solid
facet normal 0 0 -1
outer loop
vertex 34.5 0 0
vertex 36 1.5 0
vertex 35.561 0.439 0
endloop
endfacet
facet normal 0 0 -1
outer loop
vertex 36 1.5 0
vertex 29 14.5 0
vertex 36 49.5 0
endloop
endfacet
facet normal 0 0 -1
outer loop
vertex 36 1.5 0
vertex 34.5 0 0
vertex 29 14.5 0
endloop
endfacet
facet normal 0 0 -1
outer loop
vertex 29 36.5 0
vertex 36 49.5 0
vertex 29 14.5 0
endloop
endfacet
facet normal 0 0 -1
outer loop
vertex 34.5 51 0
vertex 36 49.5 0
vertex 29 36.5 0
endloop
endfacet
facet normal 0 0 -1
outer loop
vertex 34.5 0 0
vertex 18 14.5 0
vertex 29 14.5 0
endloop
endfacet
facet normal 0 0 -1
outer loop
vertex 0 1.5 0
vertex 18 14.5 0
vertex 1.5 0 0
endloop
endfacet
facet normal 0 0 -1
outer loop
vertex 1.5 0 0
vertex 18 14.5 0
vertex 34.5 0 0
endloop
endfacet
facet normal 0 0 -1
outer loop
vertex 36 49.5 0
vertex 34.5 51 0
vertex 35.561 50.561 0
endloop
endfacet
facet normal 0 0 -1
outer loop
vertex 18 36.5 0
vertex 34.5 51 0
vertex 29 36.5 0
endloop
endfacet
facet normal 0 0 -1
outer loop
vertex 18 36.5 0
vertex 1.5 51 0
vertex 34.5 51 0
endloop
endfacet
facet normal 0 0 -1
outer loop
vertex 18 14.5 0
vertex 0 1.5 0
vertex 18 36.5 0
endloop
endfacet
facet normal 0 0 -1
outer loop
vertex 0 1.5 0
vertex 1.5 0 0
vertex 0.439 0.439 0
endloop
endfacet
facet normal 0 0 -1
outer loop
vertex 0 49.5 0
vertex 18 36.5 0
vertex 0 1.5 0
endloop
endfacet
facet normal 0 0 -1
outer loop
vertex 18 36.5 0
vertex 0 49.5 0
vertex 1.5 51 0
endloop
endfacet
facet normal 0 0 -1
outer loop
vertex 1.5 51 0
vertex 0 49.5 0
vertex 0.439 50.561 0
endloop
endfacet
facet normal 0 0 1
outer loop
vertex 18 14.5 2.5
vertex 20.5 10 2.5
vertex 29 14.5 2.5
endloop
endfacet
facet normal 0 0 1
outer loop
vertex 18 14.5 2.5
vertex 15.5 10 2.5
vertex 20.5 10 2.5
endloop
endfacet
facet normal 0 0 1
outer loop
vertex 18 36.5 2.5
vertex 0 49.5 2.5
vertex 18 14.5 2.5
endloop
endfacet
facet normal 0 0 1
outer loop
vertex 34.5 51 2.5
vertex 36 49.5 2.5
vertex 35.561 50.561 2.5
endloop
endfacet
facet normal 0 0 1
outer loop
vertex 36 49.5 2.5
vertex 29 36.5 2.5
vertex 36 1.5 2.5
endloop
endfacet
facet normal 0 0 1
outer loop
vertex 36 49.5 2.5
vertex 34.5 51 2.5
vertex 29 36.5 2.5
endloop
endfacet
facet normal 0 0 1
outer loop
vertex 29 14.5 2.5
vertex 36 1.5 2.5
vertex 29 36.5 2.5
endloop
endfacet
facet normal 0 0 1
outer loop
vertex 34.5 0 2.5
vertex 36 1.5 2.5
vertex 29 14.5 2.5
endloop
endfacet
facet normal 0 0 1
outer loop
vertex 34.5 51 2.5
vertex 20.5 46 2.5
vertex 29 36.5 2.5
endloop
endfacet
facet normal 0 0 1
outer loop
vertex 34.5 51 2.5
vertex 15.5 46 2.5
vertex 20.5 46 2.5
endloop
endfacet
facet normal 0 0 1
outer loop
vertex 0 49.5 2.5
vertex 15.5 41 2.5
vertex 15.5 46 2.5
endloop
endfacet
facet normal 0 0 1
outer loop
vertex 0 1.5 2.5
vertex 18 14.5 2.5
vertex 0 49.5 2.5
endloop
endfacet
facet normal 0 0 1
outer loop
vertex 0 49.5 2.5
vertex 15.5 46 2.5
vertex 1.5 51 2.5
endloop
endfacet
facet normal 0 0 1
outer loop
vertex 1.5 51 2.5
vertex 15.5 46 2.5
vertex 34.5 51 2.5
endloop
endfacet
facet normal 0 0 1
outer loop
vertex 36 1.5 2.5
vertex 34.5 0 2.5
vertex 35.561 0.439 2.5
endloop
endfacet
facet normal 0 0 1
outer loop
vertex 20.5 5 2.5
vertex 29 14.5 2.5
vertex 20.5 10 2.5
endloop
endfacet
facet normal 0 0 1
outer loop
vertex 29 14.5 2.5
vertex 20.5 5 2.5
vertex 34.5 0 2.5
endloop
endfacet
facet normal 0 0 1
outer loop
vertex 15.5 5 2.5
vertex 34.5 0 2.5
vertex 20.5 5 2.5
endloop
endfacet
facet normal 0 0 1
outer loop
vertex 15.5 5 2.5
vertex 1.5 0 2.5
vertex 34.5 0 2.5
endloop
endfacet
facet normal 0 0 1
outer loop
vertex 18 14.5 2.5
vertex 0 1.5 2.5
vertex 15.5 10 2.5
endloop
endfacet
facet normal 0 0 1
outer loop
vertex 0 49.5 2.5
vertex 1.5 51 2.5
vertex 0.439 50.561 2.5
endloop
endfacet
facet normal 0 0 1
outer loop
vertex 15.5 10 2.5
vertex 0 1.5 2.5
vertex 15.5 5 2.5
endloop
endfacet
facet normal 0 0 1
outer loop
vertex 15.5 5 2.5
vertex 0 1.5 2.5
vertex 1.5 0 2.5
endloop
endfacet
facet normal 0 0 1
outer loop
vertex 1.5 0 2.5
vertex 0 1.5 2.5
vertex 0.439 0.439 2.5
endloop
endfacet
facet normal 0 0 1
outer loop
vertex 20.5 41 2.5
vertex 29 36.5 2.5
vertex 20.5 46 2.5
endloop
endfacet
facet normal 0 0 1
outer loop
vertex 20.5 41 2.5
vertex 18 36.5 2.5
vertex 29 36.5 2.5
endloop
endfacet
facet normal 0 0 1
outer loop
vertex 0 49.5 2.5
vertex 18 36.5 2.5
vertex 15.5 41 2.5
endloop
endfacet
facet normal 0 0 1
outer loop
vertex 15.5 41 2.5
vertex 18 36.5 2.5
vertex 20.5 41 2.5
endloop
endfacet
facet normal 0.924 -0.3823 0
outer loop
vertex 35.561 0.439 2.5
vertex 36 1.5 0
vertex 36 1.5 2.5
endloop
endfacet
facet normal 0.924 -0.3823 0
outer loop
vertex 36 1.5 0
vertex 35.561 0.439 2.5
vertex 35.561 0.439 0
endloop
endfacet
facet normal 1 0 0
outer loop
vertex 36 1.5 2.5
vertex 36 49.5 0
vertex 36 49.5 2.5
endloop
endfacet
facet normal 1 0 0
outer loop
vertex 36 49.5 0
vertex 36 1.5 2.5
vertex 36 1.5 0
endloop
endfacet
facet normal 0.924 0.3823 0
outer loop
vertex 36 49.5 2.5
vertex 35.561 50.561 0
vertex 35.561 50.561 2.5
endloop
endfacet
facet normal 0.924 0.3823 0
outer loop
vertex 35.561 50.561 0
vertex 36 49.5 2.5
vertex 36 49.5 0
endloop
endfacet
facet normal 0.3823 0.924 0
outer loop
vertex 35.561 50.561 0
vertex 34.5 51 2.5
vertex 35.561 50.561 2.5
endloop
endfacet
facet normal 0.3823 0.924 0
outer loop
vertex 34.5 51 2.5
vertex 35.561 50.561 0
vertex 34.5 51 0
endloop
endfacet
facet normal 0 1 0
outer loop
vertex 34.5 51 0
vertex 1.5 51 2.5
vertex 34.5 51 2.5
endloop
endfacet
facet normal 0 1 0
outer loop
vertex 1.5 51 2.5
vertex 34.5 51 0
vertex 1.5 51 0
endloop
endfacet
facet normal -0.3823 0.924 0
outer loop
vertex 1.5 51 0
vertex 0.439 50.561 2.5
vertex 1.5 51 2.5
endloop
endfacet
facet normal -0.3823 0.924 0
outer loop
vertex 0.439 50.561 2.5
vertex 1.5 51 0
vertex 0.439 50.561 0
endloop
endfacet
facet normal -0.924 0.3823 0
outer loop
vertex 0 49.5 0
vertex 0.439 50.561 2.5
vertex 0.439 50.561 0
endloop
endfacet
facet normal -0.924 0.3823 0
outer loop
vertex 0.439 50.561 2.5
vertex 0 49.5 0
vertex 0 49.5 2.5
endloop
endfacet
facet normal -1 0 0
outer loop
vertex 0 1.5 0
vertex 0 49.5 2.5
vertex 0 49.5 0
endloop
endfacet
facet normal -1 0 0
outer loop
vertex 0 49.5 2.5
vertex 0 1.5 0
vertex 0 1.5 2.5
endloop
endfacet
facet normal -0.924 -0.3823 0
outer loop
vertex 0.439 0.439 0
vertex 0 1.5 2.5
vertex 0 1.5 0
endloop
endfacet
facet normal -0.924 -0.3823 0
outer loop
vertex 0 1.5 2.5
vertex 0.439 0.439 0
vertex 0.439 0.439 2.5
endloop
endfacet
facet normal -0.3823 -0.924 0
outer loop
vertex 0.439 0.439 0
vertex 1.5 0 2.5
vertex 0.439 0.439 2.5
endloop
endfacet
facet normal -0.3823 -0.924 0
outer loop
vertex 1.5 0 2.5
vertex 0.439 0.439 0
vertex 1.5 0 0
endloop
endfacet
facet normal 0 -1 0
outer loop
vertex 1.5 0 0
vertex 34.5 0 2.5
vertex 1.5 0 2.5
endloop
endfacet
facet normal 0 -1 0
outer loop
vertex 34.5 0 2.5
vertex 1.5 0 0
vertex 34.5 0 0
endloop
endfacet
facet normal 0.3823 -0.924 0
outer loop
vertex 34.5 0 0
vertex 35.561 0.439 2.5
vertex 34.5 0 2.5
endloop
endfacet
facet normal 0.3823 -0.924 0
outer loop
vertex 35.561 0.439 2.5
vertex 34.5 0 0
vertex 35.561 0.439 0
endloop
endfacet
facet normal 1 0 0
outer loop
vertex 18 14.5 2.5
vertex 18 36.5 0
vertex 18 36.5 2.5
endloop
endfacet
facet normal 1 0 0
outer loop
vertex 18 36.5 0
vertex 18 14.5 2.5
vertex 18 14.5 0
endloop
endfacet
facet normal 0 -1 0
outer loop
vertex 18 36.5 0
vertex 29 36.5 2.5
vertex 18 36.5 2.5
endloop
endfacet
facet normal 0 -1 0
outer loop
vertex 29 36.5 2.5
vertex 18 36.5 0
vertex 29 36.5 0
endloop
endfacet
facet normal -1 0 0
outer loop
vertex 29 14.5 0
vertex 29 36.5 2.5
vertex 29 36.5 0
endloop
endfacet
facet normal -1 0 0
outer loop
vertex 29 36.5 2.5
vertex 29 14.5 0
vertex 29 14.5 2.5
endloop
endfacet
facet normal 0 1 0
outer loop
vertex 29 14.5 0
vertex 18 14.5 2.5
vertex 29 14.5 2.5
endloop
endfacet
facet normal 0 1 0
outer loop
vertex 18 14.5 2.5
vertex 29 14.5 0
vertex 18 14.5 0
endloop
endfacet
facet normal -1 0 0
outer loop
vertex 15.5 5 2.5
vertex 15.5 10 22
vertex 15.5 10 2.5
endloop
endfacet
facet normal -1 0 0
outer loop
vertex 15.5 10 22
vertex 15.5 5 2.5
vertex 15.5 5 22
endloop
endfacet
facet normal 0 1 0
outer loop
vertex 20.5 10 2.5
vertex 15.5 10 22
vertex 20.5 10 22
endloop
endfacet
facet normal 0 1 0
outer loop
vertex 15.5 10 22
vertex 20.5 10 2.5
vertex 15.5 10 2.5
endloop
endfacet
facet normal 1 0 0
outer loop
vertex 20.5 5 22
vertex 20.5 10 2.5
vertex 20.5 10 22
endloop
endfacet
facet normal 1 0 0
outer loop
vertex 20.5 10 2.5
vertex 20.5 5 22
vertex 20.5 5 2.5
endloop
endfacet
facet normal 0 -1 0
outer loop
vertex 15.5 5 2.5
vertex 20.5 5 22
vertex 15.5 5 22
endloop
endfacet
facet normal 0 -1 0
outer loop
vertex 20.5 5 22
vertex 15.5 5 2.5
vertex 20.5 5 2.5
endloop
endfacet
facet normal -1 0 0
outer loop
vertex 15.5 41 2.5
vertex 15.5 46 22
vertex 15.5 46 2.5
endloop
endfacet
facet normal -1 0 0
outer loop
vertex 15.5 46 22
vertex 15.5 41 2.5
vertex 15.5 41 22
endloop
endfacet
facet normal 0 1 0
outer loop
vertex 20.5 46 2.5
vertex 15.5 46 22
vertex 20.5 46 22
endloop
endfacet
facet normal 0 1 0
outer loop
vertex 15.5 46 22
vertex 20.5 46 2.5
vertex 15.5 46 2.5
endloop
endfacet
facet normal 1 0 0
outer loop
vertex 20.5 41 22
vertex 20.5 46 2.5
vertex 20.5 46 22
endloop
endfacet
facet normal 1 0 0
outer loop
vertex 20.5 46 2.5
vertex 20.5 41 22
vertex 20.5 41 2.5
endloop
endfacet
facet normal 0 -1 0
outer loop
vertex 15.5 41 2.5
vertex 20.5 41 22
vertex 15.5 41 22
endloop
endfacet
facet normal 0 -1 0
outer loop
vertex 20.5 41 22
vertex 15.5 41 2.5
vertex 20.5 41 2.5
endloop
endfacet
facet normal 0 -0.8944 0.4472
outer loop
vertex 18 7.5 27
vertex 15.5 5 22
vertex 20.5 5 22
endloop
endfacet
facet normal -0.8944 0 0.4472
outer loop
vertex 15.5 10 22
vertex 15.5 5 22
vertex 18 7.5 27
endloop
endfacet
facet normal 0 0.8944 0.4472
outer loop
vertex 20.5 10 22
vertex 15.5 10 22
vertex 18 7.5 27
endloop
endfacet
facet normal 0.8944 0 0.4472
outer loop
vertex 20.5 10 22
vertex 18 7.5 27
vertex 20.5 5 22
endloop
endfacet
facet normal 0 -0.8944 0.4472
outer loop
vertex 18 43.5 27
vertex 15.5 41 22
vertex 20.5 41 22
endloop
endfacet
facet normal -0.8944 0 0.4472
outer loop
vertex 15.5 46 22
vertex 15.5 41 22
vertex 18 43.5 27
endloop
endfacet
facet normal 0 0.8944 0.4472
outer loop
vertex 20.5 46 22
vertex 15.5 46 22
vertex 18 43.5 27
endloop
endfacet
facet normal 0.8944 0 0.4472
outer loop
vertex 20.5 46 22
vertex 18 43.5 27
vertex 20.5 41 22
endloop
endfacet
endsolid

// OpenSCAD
// file: ../library/lib.scad
include <./config.scad>;

// This function is limited to 11 elements!
function unshift(vec) = [ vec[1], vec[2], vec[3], vec[4], vec[5], vec[6], vec[7], vec[8], vec[9], vec[10], vec[11] ];

module showVector(vector)
// showVector(vector = [ 10, 10, 10 ]);
{
    start = [ 0, 0, 0 ];           // Starting point of the vector
    length = norm(vector - start); // Length of the vector
    x = vector[0];
    y = vector[1];
    z = vector[2];
    b = acos(z / length); // inclination angle
    c = atan2(y, x);      // azimuthal angle

    rotate([ 0, b, c ]) cylinder(h = length, r = 0.2);
    // % cube(vector); // corner of cube should coinciqde with end of cylin
}
// This function is limited to 11 elements!
function unshift(vec) = [ vec[1], vec[2], vec[3], vec[4], vec[5], vec[6], vec[7], vec[8], vec[9], vec[10], vec[11] ];

module showVector(vector)
// showVector(vector = [ 10, 10, 10 ]);
{
    start = [ 0, 0, 0 ];           // Starting point of the vector
    length = norm(vector - start); // Length of the vector
    x = vector[0];
    y = vector[1];
    z = vector[2];
    b = acos(z / length); // inclination angle
    c = atan2(y, x);      // azimuthal angle

    rotate([ 0, b, c ]) cylinder(h = length, r = 0.2);
    // % cube(vector); // corner of cube should coinciqde with end of cylin
}

// Allows to rotate a vector around the x, y and z axis while keeping original object rotation axis
// very usefull to rotate something around certain point in human readable format
// normal rotate() module stops being sane after second rotation
// i.e. rotate() rotate() rotate() will yield unexpected results if you are rotating for non 90 degree angles

module gimbalRotate(vector)
{
    x = vector[0];
    y = vector[1];
    z = vector[2];
    xVector = [ 1, 0, 0 ];
    yVector = [ 0, cos(x), sin(x) ];
    zVector = [ sin(y), -sin(x) * cos(y), cos(x) * cos(y) ];
    rotate(a = z, v = zVector) rotate(a = y, v = yVector) rotate(a = x, v = xVector) children(0);
}

// Same like linear_extrude but with negative parameters,
// and allows to extrude in both directions if you provide two parameters
module push(x, y)
{
    if (y == undef)
    {
        if (x > 0)
        {
            linear_extrude(x) children(0);
        }
        else
        {
            translate([ 0, 0, x ]) linear_extrude(x * -1) children(0);
        }
    }
    else
    {
        if (x > 0 && y > 0)
        {
            translate([ 0, 0, -y ]) linear_extrude(height = x + y) children(0);
        }
    }
}

// Utility module used to create shapes by cutting planes form them
// we can not cut a plane, but we can cut a sufficiently big cube, which is the same
module cut(size)
{

    if (size > 0)
    {
        push(size) square([ size, size ], center = true);
    }
    else
    {
        push(size) square([ -size, -size ], center = true);
    }
}

// Utility module used to create walls
// usfull to create boxes
module wall(thikness, size)
{
    intersection()
    {
        cut(size);
        translate([ 0, 0, thikness ]) cut(-size);
    }
}

// Debug module to show the wall anchor
module showWall()
{
    union()
    {
        translate([ 0, 0, 15 ]) cube([ 1, 1, 30 ], center = true);
        sphere(r = 5);
    }
}

// Utility module to translate and rotate an object by a vector containing the translation and rotation values
// Limited to 11 elements
module moveRotateTranslate(rt)
{
    assert(len(rt) < 12, "rotation translation vector can not have more than 11 elements");
    if (rt[0] == undef)
    {
        children(0);
    }
    else
    {
        if (rt[1] == undef)
        {
            if (rt[0][0] == "r")
            {
                rotate(rt[0][1]) children(0);
            }
            if (rt[0][0] == "t")
            {
                translate(rt[0][1]) children(0);
            }
        }
        else
        {
            if (rt[0][0] == "r")
            {
                rotate(rt[0][1]) moveRotateTranslate(unshift(rt)) children(0);
            }
            if (rt[0][0] == "t")
            {
                translate(rt[0][1]) moveRotateTranslate(unshift(rt)) children(0);
            }
        }
    }
}

// see box.scad for usage and debug examples
module box(walls, cutters, thikness, cutter)
{
    for (i = walls)
    {
        difference()
        {
            moveRotateTranslate(i) wall(thikness, cutter);
            for (i = cutters)
            {
                moveRotateTranslate(i) cut(-cutter);
            }
        }
    }
}

// if you have .dxf file and want to find its anchor point that is very uesfull
//  find_anchor([ 90, 0, 0 ]) import("path/to/file.dxf");
//  try rotating around x, y and z axis by 90 and 180 to find the anchor point
module find_anchor(v)
{
    children(0);
    color("yellow") rotate(v) children(0);
}

module anchor_thumb()
{
    translate([ thumbXOffset, thumbYOffset, thumbZOffset ])
        gimbalRotate([ thumbXRotation, thumbYRotation, thumbZRotation ]) rotate([ 0, 90, -90 ]) children(0);
}
module anchor_pcb()
{
    rotate([ 0, -tentingAngle, 0 ]) children(0);
}
module table()
{
    color("brown") translate([ -50, 0, -tableThikness ]) linear_extrude(tableThikness) square([ 300, 250 ]);
}

// LEFT
module left_pcb_dxf()
{
    // bottom left corner
    translate([ 7, 8.5, 0 ]) import("../../production/pcbs/left/left_pcb_edgecut.dxf");
}
module left_keycaps_dxf()
{
    // bottom left corner
    translate([ 7, 8.5, 0 ]) import("../../production/pcbs/left/left_keycaps.dxf");
}
module left_pcb_with_keys_dxf()
{
    // bottom left corner
    translate([ 7, 8.5, 0 ]) import("../../production/pcbs/left/left_pcb_edgecut_with_keys.dxf");
}
module left_switch_cutouts_dxf()
{
    // bottom left corner
    translate([ 7, 8.5, 0 ]) import("../../production/pcbs/left/left_switch_cutouts.dxf");
}
module left_screw_dxf()
{
    // bottom left corner
    translate([ 7, 8.5, 0 ]) import("../../production/pcbs/left/left_screw.dxf");
}
module left_screw_holes_dxf()
{
    // bottom left corner
    translate([ 7, 8.5, 0 ]) import("../../production/pcbs/left/left_screw_holes.dxf");
}
module left_pcb()
{
    color(pcbColor) linear_extrude(pcbAndHotswapThikness) left_pcb_dxf();
}

// THUMB

module thumb_dxf()
{
    // bottom left corner
    translate([ 9, 8.5, 0 ]) import("../../production/pcbs/thumb/thumb_pcb_edgecut.dxf");
}
module thumb_switch_cutouts_dxf()
{
    // bottom left corner
    translate([ 9, 8.5, 0 ]) import("../../production/pcbs/thumb/thumb_switch_cutouts.dxf");
}
module thumb_screw_dxf()
{
    // bottom left corner
    translate([ 9, 8.5, 0 ]) import("../../production/pcbs/thumb/thumb_screw.dxf");
}
module thumb_screw_holes_dxf()
{
    // bottom left corner
    translate([ 9, 8.5, 0 ]) import("../../production/pcbs/thumb/thumb_screw_holes.dxf");
}
module thumb_pcb()
{
    color("lightgreen") linear_extrude(pcbAndHotswapThikness) thumb_dxf();
}

module left_keys()
{
    translate([ 0, 0, pcbAndHotswapThikness ]) color(keysColor) linear_extrude(keysThikness) left_keycaps_dxf();
}
module left_case()
{
    color("grey") translate([ 0, 0, -caseThikness ]) push(caseThikness) left_case_dxf();
}

module thumb_keys()
{
    translate([ 0, 0, pcbAndHotswapThikness ]) color(keysColor) linear_extrude(keysThikness) thumb_dxf();
}

// NNANO
module nice_nano_mount_to_pcb()
{
    // translate for the pcb anchor
    translate([ 86.6, 29, 0 ]) rotate([ 180, 0, 90 ]) children(0);
}
module nice_nano()
{
    color("lightblue")
        // set anchor to bottom outermost corner hole of the pcb
        translate([ 15.24, -7.62, 6.3 ]) color(pcbColor) import("../shared-3d-models/nice-nano.stl");
}
// file: ../library/config.scad
pcbAndHotswapThikness = 3;
caseThikness = 2.5;
wallOffsetFromPcb = 1;
wallOffsetFromConnector = 3;
tentingAngle = 60;
tableThikness = 10;
keysThikness = 11;
caseColor = "grey";
pcbColor = "darkgreen";
keysColor = "white";
screwBumpSize = 2.5;
thumbXOffset = 49;
thumbYOffset = 28;
thumbZOffset = 71;
thumbXRotation = -20;
thumbYRotation = 35;
thumbZRotation = -10;
niceNanoCutoutDepth = 8;
switchCutout = 13.8;
switchCutoutDepth = 2.2;
extensionWidth = 60 + (caseThikness + wallOffsetFromPcb) * 2;
extensionLength = 90;
extensionShift = 11 - caseThikness - wallOffsetFromPcb;
pcbWidth = 90;
cutter = 400;
ccFarWall = 120;

ccFrontWall = 5 + caseThikness;
ccBackWall = 58 + ccFrontWall + caseThikness;

magnetStripeWidth = 26;
magnetStripeDepth = 0.7;
// legs
legRubberDepth = 1;
legRubberDiameter = 8;
legsInsideDepth = 5;
legs = [
    [ 5, 69 - legRubberDiameter / 2 - caseThikness ], [ 5, 13 ],
    [ ccFarWall - legRubberDiameter / 2 - caseThikness, 13 ],
    [ ccFarWall - legRubberDiameter / 2 - caseThikness, 69 - legRubberDiameter / 2 - caseThikness ]
];

// case to case mounting
screwHoleDiameter = 2.3;
// main file
include <../library/config.scad>;
use <../library/lib.scad>;
legDepth = 22;
legThickness = 5;
legOffset = 5;
thumbClusterWidth = 51;
thumbClusterHeight = 36;

module anchorLeft()
{
    translate([ thumbClusterHeight / 2, legOffset + legThickness / 2, 0 ]) children(0);
}
module anchorRight()
{
    translate([ thumbClusterHeight / 2, thumbClusterWidth - legThickness / 2 - legOffset, 0 ]) children(0);
}
union()
{
    push(caseThikness) difference()
    {
        thumb_dxf();
        thumb_screw_holes_dxf();
    }

    push(legDepth) anchorLeft() square(legThickness, center = true);
    push(legDepth) anchorRight() square(legThickness, center = true);

    translate([ 0, 0, legDepth ]) anchorLeft() linear_extrude(height = legThickness, scale = -10)
        square(legThickness, center = true);
    translate([ 0, 0, legDepth ]) anchorRight() linear_extrude(height = legThickness, scale = -10)
        square(legThickness, center = true);
}
